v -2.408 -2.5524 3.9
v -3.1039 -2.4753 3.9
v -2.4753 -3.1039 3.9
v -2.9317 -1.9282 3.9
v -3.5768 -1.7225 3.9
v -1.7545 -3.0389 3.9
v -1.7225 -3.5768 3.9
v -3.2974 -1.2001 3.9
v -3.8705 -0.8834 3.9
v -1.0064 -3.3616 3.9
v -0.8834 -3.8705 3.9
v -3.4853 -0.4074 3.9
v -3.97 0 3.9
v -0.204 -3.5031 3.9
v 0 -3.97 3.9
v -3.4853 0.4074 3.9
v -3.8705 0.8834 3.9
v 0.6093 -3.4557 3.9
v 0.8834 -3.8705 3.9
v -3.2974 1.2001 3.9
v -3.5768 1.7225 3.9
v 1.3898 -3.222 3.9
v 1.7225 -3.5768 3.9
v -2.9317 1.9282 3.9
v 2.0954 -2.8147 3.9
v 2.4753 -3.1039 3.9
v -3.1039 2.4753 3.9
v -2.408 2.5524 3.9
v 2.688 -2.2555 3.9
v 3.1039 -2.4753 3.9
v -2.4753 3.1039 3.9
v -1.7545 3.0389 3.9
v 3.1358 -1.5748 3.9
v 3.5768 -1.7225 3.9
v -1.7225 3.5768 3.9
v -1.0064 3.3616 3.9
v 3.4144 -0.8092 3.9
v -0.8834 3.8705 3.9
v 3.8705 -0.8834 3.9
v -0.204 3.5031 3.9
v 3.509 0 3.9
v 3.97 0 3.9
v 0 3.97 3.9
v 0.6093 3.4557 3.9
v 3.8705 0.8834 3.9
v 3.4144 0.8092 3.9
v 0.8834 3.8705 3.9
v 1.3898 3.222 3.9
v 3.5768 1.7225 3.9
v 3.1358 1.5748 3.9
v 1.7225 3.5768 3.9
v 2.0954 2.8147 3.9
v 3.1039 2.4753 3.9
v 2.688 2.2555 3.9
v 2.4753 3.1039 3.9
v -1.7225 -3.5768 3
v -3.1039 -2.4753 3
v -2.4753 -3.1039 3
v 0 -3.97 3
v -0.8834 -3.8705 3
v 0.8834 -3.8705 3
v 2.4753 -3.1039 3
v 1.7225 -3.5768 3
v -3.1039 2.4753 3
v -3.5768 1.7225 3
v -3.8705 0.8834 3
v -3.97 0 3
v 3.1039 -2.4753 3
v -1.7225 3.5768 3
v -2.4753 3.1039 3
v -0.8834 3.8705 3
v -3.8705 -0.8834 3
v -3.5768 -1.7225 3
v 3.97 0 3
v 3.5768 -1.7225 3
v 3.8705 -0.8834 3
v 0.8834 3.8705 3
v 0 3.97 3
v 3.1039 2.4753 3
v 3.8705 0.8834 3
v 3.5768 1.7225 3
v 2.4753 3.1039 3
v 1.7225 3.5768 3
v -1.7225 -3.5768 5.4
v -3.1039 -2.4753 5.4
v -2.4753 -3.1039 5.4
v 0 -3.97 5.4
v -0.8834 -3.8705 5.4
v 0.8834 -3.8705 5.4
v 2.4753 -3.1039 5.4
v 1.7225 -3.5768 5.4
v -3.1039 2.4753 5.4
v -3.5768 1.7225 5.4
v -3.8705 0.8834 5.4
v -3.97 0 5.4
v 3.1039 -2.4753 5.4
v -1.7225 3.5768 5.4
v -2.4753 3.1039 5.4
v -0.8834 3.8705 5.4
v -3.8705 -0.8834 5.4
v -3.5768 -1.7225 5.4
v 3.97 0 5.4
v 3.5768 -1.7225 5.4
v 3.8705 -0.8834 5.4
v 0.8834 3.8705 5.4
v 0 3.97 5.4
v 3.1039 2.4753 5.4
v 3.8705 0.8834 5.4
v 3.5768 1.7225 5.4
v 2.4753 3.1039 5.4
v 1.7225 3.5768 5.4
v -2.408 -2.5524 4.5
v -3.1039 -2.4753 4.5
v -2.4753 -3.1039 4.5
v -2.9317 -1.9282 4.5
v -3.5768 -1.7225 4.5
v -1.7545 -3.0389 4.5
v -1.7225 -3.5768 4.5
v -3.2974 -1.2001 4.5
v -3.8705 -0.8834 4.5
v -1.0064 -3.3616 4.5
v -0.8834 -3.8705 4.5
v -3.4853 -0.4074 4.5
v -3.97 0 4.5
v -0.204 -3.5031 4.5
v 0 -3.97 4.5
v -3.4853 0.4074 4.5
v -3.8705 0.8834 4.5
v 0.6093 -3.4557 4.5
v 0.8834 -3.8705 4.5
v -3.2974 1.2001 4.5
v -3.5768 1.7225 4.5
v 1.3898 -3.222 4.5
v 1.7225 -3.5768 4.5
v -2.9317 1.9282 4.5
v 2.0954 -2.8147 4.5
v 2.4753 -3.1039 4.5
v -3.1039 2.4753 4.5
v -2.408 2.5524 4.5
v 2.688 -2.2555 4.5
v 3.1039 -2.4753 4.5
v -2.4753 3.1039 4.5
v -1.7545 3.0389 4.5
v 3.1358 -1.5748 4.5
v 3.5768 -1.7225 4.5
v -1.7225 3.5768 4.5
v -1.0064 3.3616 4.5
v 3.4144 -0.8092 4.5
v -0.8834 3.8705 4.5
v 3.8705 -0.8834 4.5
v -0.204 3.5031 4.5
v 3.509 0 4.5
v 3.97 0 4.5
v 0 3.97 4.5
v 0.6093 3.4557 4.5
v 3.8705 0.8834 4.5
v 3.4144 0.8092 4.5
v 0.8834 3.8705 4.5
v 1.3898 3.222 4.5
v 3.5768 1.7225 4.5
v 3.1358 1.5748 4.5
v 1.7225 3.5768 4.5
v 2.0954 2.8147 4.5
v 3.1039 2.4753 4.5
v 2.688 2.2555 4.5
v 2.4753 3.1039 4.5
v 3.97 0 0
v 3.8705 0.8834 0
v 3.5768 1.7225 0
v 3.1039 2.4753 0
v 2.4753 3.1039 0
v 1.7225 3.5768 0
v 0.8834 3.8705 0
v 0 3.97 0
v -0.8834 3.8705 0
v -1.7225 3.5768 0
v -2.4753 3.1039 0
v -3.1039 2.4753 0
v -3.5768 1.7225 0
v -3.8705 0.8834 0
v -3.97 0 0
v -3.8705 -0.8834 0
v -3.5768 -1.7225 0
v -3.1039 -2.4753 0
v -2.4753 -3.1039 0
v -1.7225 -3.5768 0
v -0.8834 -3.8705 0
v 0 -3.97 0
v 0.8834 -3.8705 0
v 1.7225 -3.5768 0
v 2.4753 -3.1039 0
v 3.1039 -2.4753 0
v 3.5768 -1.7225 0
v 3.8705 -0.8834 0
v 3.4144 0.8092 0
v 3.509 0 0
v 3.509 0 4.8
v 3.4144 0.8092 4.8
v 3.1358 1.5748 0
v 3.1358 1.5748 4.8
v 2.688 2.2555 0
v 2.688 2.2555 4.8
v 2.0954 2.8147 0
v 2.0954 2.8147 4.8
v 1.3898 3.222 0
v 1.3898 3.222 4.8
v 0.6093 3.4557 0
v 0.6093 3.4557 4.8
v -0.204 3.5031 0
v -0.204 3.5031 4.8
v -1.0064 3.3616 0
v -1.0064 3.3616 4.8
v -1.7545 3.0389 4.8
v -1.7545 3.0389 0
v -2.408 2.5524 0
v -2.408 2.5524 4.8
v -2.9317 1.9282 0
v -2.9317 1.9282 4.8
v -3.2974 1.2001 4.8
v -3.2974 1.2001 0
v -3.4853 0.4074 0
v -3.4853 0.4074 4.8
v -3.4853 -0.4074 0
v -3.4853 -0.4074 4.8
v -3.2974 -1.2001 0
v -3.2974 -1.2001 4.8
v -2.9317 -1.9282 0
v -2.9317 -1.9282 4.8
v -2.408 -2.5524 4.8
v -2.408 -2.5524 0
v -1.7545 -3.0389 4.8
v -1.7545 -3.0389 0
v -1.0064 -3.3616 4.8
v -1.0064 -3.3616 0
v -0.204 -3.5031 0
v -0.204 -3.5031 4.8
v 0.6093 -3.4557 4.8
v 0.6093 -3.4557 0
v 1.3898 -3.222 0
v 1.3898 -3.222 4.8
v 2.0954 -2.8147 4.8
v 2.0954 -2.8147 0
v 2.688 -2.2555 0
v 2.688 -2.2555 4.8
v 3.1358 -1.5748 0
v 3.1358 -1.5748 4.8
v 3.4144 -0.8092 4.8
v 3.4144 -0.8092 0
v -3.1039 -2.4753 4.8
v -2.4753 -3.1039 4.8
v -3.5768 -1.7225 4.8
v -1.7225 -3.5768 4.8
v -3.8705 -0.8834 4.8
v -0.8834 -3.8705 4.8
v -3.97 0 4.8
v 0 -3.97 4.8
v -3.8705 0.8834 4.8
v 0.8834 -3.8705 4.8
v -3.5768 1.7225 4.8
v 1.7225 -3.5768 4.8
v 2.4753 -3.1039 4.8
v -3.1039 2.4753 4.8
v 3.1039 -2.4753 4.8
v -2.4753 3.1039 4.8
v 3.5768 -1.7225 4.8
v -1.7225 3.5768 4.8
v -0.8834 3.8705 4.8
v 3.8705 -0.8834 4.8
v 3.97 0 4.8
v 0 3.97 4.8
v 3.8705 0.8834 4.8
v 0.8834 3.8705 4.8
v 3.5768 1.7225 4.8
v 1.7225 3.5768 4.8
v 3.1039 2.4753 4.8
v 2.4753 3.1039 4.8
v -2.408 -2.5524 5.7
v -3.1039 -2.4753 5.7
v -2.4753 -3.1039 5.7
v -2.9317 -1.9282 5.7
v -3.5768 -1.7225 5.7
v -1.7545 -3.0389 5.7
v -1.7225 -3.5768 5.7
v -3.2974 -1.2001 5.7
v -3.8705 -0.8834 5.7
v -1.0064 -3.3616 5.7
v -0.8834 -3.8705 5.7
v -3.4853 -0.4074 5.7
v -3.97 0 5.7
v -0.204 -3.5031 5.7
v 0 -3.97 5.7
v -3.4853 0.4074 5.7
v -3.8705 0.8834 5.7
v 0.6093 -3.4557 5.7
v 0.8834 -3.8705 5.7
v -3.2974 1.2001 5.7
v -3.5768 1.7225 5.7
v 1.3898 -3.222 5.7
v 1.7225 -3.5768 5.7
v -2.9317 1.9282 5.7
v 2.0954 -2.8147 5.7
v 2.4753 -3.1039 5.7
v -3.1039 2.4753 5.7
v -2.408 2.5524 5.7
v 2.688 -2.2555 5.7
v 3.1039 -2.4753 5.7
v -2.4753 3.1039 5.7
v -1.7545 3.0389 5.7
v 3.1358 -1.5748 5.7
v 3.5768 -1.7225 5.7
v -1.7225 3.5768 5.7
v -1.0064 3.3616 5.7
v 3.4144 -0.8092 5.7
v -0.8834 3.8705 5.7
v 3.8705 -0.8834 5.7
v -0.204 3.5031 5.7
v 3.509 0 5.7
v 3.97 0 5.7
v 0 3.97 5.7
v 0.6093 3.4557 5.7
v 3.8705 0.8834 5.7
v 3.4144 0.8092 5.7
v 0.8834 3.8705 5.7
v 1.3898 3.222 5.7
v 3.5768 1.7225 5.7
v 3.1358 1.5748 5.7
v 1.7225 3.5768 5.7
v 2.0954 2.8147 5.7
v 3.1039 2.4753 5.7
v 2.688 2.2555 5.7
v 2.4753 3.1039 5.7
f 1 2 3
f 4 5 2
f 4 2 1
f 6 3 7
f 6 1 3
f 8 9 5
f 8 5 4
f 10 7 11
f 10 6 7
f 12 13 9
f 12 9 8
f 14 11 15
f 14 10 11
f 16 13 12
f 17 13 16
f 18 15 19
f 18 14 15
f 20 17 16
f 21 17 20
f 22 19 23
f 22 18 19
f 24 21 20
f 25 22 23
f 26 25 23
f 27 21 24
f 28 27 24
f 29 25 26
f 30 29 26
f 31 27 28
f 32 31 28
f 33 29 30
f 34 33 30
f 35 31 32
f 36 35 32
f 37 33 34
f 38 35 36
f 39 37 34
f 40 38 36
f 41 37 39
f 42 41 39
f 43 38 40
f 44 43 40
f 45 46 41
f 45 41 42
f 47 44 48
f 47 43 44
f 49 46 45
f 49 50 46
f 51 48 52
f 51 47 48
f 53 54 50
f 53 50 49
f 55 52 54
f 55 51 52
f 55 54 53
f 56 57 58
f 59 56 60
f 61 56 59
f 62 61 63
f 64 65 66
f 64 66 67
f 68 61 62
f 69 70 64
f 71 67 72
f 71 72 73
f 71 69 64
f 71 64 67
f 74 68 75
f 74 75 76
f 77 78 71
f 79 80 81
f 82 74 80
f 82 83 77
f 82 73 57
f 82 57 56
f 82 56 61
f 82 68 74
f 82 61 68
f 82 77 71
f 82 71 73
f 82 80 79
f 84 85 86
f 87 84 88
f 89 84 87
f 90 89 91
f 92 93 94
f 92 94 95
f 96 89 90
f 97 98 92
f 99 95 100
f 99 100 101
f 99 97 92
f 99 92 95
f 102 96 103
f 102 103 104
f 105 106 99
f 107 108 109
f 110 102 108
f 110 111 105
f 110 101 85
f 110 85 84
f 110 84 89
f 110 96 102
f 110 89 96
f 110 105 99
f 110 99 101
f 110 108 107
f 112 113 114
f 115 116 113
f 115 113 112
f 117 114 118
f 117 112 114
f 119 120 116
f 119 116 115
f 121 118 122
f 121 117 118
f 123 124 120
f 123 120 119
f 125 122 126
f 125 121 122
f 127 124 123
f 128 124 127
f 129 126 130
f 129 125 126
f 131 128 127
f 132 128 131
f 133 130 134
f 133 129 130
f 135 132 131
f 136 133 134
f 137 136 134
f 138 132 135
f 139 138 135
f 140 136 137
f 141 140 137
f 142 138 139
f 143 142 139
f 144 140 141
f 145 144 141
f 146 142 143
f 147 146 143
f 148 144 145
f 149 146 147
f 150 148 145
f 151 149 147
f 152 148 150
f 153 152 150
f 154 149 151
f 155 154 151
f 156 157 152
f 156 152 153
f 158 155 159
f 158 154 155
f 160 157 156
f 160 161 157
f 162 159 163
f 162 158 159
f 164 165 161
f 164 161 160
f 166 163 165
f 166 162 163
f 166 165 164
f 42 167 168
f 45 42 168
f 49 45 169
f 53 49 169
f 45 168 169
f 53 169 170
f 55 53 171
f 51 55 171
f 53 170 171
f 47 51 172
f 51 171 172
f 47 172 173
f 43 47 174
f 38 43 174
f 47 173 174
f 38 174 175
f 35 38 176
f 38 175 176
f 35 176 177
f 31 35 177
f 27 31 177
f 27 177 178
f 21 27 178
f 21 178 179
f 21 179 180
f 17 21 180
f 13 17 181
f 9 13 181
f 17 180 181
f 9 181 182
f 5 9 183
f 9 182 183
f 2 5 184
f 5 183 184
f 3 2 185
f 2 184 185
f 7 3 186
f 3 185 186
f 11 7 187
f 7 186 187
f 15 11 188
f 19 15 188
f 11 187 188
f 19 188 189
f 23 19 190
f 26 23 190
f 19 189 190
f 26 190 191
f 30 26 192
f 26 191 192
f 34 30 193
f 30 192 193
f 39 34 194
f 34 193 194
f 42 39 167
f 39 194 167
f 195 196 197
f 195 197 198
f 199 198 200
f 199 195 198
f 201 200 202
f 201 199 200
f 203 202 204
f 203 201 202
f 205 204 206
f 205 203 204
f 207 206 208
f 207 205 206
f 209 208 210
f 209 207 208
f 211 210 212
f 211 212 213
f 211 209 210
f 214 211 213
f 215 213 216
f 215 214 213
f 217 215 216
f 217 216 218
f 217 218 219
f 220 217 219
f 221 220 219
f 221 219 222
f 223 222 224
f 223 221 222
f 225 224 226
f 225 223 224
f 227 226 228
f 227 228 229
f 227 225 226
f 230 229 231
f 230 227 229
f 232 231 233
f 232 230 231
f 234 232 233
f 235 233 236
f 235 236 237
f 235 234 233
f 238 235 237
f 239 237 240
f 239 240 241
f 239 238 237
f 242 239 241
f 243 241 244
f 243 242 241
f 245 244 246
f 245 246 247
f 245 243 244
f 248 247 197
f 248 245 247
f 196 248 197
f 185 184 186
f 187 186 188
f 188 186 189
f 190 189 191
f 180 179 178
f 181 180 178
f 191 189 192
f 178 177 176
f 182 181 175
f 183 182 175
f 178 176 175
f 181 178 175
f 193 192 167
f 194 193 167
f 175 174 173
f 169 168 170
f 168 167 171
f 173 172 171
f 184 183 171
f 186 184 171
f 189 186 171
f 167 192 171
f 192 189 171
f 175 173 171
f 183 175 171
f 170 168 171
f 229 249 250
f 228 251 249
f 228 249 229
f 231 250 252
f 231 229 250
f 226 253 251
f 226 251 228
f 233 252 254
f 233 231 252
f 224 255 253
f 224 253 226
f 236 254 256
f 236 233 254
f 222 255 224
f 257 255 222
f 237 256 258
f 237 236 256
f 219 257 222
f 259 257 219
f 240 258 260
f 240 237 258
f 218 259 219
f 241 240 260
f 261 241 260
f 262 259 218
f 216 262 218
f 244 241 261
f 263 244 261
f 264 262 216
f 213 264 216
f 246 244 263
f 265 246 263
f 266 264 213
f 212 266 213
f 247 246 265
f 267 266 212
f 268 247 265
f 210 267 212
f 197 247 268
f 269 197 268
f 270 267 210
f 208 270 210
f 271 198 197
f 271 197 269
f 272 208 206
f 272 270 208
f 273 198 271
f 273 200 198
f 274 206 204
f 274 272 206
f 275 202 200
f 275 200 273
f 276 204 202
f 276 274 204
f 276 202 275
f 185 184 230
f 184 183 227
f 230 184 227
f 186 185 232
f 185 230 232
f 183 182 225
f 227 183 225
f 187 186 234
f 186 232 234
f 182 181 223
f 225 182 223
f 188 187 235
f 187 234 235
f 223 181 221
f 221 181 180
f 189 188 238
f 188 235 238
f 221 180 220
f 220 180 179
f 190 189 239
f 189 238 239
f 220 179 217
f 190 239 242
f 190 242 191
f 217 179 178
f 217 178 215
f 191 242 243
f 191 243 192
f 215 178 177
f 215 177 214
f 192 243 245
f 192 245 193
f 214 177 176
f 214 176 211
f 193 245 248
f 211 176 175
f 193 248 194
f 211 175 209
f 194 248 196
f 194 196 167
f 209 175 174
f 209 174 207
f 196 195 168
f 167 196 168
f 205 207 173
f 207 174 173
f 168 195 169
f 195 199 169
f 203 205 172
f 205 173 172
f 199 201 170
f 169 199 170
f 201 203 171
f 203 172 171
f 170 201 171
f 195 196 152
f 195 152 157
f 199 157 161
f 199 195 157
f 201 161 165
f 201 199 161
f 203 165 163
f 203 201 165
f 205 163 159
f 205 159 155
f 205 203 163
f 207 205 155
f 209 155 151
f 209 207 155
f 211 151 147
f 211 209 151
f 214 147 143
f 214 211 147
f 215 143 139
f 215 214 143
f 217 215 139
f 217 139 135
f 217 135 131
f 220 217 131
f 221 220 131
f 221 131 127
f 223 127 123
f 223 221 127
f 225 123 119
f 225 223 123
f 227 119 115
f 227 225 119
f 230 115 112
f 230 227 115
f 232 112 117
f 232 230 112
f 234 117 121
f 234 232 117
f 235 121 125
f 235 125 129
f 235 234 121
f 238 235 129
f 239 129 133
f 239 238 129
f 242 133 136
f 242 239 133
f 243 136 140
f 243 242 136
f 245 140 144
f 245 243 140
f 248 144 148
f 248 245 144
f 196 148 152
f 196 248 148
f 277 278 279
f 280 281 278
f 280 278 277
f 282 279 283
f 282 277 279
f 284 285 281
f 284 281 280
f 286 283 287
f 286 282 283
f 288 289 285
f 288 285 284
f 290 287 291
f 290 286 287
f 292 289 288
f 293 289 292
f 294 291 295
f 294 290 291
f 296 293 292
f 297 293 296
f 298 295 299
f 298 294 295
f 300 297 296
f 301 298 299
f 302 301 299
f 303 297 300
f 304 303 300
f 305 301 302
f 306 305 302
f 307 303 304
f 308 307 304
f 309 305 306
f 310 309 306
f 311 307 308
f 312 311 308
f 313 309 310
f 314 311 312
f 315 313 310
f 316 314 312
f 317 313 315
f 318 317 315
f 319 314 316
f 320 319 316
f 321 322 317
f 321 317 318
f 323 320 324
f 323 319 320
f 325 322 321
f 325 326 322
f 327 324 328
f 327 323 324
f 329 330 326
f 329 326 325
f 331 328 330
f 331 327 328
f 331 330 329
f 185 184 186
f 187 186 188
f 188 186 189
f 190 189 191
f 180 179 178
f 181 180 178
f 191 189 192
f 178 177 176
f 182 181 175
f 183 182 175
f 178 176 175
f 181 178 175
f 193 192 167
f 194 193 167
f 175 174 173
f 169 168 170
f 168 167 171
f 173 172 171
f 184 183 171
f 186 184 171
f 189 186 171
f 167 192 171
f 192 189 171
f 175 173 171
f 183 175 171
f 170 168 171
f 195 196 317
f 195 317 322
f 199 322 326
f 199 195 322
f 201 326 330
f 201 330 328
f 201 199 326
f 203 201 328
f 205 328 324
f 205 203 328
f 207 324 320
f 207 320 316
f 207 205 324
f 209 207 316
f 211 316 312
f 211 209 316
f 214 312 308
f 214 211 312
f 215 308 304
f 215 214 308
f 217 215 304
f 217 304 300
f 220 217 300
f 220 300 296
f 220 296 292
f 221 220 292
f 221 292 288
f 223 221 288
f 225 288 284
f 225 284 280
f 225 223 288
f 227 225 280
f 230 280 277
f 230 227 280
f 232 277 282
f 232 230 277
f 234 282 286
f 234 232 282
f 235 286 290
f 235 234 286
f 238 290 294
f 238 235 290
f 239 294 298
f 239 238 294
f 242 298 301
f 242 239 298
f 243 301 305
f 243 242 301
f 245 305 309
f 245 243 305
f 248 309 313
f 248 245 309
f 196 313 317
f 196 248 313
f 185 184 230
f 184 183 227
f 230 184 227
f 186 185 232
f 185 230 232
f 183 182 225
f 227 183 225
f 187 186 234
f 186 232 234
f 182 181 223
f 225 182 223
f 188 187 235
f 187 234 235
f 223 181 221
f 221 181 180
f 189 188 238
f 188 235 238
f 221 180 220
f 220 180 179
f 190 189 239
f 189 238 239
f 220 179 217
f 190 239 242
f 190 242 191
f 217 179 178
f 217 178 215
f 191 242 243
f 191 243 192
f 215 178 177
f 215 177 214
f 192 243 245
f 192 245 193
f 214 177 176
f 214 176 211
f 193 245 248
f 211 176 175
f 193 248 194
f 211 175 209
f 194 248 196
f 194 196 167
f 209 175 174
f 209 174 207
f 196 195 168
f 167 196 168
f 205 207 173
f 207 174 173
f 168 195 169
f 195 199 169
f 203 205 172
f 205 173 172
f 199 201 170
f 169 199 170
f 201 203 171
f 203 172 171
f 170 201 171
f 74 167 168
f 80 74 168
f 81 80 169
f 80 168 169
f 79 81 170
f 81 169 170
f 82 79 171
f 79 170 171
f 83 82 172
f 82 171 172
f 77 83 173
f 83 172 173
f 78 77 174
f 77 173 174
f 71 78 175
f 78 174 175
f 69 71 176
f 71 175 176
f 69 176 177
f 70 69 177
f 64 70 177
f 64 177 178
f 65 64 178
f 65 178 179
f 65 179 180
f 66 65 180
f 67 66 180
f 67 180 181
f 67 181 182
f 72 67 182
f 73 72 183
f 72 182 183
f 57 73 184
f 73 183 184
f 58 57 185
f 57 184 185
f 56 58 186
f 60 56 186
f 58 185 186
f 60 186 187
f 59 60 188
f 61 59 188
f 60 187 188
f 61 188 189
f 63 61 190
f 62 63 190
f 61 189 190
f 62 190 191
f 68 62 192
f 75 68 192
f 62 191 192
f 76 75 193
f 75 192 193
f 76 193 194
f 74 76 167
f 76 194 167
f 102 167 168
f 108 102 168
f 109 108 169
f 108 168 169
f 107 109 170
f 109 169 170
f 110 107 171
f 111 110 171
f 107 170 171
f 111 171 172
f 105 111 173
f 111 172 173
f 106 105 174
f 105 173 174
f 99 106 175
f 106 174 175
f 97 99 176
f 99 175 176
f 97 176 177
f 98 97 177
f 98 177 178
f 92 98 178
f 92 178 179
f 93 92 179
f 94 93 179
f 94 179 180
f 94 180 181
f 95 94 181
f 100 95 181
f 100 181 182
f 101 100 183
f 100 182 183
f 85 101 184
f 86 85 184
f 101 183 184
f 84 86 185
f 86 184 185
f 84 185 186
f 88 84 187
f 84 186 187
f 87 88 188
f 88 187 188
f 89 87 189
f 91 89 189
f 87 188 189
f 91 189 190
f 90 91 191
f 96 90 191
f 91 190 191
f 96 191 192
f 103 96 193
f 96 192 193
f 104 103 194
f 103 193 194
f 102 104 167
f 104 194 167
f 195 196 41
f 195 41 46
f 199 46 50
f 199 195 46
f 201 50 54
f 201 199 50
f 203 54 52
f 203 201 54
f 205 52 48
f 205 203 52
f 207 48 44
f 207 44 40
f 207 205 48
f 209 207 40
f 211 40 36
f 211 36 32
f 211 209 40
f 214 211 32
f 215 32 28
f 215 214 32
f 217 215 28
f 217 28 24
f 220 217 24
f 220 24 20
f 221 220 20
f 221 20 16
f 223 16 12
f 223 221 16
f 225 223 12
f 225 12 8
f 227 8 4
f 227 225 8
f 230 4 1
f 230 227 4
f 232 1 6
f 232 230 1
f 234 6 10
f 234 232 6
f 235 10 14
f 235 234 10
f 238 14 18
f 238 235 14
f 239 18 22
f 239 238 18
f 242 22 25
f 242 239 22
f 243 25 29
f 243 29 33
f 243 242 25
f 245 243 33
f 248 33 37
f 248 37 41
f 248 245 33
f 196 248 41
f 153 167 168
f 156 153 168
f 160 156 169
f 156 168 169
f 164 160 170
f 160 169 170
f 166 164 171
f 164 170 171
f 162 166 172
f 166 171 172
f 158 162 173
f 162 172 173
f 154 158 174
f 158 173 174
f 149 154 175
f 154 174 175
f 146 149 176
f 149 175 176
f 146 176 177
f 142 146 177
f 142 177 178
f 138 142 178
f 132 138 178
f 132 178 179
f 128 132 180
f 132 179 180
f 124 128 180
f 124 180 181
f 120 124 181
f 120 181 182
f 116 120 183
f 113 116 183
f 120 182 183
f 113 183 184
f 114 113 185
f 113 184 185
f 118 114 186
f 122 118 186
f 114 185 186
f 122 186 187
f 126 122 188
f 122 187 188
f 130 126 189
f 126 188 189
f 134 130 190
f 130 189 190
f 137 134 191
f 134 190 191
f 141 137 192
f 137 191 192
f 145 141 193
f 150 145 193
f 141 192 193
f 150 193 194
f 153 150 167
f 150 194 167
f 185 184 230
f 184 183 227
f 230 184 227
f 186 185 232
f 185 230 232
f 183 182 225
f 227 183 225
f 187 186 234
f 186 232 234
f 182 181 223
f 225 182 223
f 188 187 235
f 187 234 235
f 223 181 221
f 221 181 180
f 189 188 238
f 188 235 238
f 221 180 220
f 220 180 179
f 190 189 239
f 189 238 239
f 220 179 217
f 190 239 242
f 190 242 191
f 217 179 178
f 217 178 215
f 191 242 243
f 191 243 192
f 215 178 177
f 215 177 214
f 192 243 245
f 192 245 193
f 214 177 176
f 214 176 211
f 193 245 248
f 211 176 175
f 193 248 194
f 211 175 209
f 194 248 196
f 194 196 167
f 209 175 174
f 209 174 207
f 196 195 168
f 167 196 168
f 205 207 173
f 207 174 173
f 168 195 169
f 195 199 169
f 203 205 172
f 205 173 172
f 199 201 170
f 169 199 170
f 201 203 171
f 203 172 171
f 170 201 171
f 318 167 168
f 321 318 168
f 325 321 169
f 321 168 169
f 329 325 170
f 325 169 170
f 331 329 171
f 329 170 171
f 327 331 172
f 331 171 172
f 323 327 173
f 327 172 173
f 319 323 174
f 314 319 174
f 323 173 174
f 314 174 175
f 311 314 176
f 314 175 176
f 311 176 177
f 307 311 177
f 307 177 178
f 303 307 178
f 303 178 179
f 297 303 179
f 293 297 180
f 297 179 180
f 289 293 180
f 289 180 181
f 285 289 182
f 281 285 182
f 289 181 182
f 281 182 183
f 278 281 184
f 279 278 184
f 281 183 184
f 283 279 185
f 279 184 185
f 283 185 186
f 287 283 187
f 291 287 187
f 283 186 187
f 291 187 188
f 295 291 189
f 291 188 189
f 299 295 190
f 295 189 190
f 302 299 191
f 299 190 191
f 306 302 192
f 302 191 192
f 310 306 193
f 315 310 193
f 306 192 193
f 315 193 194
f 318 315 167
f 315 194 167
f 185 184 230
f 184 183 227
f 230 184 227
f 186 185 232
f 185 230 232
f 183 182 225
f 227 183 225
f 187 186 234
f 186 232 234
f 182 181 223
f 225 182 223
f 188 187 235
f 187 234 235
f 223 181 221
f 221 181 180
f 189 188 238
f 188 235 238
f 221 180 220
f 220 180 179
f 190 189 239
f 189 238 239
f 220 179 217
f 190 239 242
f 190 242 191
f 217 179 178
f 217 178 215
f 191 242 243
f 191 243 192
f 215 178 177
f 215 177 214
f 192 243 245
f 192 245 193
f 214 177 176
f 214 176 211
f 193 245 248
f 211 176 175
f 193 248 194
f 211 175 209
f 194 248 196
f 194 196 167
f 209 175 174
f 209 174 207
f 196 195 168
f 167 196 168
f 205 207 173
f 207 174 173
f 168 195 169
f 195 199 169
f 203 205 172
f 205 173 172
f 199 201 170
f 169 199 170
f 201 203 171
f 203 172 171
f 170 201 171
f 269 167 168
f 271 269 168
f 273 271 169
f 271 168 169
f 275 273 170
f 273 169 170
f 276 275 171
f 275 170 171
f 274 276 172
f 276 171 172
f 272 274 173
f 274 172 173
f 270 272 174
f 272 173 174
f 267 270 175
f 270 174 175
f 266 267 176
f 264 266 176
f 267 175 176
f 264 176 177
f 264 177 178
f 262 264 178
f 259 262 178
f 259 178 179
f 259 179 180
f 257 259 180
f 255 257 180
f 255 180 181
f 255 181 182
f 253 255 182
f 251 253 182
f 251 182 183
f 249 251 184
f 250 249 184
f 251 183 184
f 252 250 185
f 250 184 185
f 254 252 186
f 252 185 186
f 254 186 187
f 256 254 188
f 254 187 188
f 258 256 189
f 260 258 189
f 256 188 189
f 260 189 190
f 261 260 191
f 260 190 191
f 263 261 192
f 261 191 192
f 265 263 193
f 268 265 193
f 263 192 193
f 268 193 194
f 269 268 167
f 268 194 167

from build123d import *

# Parameters (mm, degrees)
F0_R     = 1.3233333333
F0_R_2   = 1.1696666667
F1_DEPTH = 1.5
F2_DEPTH = 1.6
F3_DEPTH = 1.8
F4_DEPTH = 1.9
F5_DEPTH = 1.3
F6_DEPTH = 1
F7_SCALE = 3


with BuildPart() as f1:
    # F0 (on Top) → F1 (new body)
    with BuildSketch(Plane.XY):
        Circle(F0_R)
        Circle(F0_R_2, mode=Mode.SUBTRACT)
    extrude(amount=F1_DEPTH)


with BuildPart() as f2:
    # F0 (on Top) → F2 (new body)
    with BuildSketch(Plane.XY):
        Circle(F0_R)
        Circle(F0_R_2, mode=Mode.SUBTRACT)
    extrude(amount=F2_DEPTH)


with BuildPart() as f3:
    # F0 (on Top) → F3 (new body)
    with BuildSketch(Plane.XY):
        Circle(F0_R)
        Circle(F0_R_2, mode=Mode.SUBTRACT)
        Circle(F0_R_2)
    extrude(amount=F3_DEPTH)


with BuildPart() as f4:
    # F0 (on Top) → F4 (new body)
    with BuildSketch(Plane.XY):
        Circle(F0_R)
        Circle(F0_R_2, mode=Mode.SUBTRACT)
    extrude(amount=F4_DEPTH)


with BuildPart() as f5:
    # F0 (on Top) → F5 (new body)
    with BuildSketch(Plane.XY):
        Circle(F0_R)
        Circle(F0_R_2, mode=Mode.SUBTRACT)
    extrude(amount=F5_DEPTH)


with BuildPart() as f6:
    # F0 (on Top) → F6 (new body)
    with BuildSketch(Plane.XY):
        Circle(F0_R)
        Circle(F0_R_2, mode=Mode.SUBTRACT)
        Circle(F0_R_2)
    extrude(amount=F6_DEPTH)


with BuildPart() as f1_1:
    # F7: moved
    add(f1.part.scale(F7_SCALE))


with BuildPart() as f2_1:
    # F7: moved
    add(f2.part.scale(F7_SCALE))


with BuildPart() as f3_1:
    # F7: moved
    add(f3.part.scale(F7_SCALE))


with BuildPart() as f4_1:
    # F7: moved
    add(f4.part.scale(F7_SCALE))


with BuildPart() as f5_1:
    # F7: moved
    add(f5.part.scale(F7_SCALE))


with BuildPart() as f6_1:
    # F7: moved
    add(f6.part.scale(F7_SCALE))


solid = Compound([f1_1.part, f2_1.part, f3_1.part, f4_1.part, f5_1.part, f6_1.part])
